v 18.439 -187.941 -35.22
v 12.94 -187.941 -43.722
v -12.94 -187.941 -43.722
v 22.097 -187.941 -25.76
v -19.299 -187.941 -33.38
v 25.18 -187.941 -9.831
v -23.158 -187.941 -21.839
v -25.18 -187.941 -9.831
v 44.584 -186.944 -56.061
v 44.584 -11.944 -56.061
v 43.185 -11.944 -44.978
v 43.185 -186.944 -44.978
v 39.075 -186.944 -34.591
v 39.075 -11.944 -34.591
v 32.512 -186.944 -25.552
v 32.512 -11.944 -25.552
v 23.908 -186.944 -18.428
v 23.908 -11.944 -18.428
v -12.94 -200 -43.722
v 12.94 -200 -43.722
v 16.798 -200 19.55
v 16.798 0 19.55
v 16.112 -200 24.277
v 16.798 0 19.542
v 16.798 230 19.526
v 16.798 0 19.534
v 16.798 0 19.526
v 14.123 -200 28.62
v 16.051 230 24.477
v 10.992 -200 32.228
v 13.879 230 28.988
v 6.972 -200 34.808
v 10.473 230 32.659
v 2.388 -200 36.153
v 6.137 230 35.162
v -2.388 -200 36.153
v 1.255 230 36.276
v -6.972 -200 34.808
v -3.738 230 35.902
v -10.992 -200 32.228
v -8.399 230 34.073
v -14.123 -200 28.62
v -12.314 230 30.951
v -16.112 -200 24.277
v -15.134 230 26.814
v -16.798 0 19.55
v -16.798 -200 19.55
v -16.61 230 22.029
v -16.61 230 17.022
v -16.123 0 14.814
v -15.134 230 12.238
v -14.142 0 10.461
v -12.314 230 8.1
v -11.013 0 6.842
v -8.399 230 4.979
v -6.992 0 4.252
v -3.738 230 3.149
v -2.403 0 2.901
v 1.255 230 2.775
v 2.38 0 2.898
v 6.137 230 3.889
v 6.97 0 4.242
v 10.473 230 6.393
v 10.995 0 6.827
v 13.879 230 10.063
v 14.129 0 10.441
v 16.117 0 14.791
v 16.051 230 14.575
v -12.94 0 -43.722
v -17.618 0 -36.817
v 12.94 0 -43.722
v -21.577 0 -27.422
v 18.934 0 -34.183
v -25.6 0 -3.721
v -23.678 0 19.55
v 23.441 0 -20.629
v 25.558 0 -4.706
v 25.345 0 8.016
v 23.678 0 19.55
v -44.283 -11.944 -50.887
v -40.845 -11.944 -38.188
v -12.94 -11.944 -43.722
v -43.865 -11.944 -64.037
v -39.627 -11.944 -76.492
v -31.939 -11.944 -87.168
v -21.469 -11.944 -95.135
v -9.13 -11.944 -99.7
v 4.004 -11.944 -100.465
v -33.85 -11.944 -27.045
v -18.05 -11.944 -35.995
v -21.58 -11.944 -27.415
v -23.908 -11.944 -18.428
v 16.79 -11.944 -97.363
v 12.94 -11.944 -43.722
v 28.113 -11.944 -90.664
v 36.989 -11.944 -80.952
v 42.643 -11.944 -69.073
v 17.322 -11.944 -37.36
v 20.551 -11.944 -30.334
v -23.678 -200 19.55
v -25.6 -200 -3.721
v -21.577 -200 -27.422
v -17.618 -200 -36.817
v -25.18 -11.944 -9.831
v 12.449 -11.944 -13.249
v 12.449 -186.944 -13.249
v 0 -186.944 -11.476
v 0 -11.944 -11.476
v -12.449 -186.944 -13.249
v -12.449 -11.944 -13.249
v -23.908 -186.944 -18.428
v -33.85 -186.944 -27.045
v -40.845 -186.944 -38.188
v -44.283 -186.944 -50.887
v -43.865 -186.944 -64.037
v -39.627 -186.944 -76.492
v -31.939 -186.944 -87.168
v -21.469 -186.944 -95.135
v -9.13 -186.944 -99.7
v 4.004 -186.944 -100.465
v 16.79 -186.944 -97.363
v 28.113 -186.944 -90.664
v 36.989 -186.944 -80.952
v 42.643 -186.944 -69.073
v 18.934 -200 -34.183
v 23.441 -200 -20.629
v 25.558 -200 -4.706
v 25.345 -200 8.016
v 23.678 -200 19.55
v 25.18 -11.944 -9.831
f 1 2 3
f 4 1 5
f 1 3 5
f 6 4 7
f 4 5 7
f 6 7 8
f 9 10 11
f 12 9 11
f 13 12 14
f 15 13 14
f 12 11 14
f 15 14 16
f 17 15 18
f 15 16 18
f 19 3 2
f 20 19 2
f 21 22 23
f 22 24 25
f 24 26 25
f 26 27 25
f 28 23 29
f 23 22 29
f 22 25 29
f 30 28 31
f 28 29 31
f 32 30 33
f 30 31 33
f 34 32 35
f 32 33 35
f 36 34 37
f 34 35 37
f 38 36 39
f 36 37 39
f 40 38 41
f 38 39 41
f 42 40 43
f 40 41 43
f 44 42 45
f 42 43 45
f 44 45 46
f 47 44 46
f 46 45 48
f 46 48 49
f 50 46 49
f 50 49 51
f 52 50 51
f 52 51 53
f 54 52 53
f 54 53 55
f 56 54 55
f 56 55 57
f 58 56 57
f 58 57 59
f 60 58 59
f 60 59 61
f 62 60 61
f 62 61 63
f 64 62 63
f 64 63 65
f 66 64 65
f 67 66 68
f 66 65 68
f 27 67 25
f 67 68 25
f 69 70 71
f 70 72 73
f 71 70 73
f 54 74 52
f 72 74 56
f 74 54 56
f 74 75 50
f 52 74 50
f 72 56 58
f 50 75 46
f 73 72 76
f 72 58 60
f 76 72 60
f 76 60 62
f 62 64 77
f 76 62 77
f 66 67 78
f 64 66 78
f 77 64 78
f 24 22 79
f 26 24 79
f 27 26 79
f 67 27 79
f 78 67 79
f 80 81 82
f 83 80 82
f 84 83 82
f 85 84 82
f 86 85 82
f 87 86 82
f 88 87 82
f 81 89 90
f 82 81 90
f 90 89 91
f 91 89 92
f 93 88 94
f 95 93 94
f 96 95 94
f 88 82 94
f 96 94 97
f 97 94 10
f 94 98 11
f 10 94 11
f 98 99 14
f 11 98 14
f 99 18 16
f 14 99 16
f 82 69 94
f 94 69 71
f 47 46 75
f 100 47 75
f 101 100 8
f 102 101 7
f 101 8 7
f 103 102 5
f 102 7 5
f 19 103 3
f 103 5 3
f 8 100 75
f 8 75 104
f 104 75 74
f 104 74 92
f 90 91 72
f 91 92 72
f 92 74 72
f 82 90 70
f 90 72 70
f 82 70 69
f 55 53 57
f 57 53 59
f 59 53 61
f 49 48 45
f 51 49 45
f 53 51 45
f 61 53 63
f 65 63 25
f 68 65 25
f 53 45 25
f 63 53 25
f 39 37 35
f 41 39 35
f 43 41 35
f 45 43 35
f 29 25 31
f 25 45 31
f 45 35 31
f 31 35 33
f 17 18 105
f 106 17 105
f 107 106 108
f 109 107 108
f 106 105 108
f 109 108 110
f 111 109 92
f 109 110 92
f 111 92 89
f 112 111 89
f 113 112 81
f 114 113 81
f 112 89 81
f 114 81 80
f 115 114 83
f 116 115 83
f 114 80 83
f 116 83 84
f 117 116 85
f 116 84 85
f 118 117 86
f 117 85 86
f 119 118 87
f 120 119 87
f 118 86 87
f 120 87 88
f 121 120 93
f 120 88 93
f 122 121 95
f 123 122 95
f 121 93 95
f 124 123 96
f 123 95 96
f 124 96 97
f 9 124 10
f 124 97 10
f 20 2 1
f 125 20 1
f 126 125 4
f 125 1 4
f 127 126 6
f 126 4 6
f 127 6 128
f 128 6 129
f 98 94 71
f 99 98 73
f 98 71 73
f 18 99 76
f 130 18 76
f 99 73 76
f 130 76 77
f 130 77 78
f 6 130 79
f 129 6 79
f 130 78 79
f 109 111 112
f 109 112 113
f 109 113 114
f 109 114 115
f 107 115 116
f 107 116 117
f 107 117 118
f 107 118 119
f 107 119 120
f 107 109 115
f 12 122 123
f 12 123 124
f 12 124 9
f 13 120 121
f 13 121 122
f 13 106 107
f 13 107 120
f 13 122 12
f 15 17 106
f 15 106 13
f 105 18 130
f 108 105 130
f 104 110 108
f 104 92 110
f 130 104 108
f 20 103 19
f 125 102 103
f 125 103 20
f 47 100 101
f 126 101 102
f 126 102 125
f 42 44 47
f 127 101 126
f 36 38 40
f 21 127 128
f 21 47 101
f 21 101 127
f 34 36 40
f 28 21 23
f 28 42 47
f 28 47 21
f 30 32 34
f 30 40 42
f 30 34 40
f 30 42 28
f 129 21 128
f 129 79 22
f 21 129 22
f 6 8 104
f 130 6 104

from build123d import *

# Parameters (mm, degrees)
F1_DEPTH = 200
F3_R     = 16.7976843787
F4_DEPTH = 430
F6_W     = 175.9967375547
F6_H     = 67.8384676576
F7_DEPTH = 100
F9_DEPTH = 175


with BuildPart() as f1:
    # F0 (on Front) → F1 (new body)
    with BuildSketch(Plane.XZ):
        with BuildLine():
            add(Edge.make_bspline(
                [(-23.6778533361, 19.5495877862), (-32.3621949462, -21.3626975394), (-12.9401370946, -43.7215901911)],
                knots=[1.1743261985, 1.1743261985, 1.1743261985, 2.6132353561, 2.6132353561, 2.6132353561], degree=2, weights=[1, 0.7521652597, 1]))
            Line((-12.9401370946, -43.7215901911), (12.9401370946, -43.7215901911))
            add(Edge.make_bspline(
                [(12.9401370946, -43.7215901911), (32.3621949462, -21.3626975394), (23.6778533361, 19.5495877862)],
                knots=[3.6699499511, 3.6699499511, 3.6699499511, 5.1088591087, 5.1088591087, 5.1088591087], degree=2, weights=[1, 0.7521652597, 1]))
            Line((23.6778533361, 19.5495877862), (-23.6778533361, 19.5495877862))
        make_face()
    extrude(amount=F1_DEPTH)

    # F3 (on offset) → F4 (join)
    with BuildSketch(Plane.XZ.offset(-230)):
        with Locations((0, 19.52576451)):
            Circle(F3_R)
    extrude(amount=F4_DEPTH)

    # F6 (on offset) → F7 (cut)
    with BuildSketch(Plane.YZ.offset(-30)):
        with Locations((-99.9427214265, -43.750282377)):
            Rectangle(F6_W, F6_H)
    extrude(amount=F7_DEPTH, mode=Mode.SUBTRACT)

    # F8 (on face) → F9 (join)
    with BuildSketch(Plane.XZ.offset(11.9443526492)):
        with BuildLine():
            ThreePointArc((-23.9079126368, -18.4283503945), (-21.4691661744, -95.1354199868), (44.5844215941, -56.0605488718))
            ThreePointArc((44.5844215941, -56.0605488718), (39.0748711148, -34.591382697), (23.907912636, -18.428350394))
            add(Edge.make_bspline(
                [(23.907912636, -18.428350394), (23.7403211383, -19.2740561298), (23.5629806702, -20.1178270573), (23.375722619, -20.959489825), (23.1783610081, -21.7988580379), (22.9706905105, -22.6357318329), (22.7524836933, -23.4698972976), (22.5234871985, -24.301125666), (21.8162555534, -26.7404941038), (21.3073183679, -28.3392219433), (20.754454425, -29.9239250097), (20.1551733117, -31.4923659659), (19.5066312989, -33.0414940382), (18.8054862218, -34.5673766033), (18.0477798353, -36.0651478958), (16.7672298185, -38.3517175377), (16.2868400055, -39.1637140236), (15.7860476096, -39.9635970623), (15.2638749499, -40.7499882648), (14.7193047849, -41.5211878034), (14.1512732931, -42.2751690498), (13.5586431482, -43.0095590272), (12.9401370946, -43.7215901911)],
                knots=[0.2378023461, 0.2378023461, 0.2378023461, 0.2378023461, 0.2378023461, 0.2378023461, 0.2378023461, 0.2378023461, 0.2378023461, 0.4264523686, 0.4264523686, 0.4264523686, 0.4264523686, 0.4264523686, 0.4264523686, 0.4264523686, 0.7935523887, 0.7935523887, 0.7935523887, 0.7935523887, 0.7935523887, 0.7935523887, 0.7935523887, 1, 1, 1, 1, 1, 1, 1, 1, 1], degree=8))
            Line((12.9401370946, -43.7215901911), (-12.9401370946, -43.7215901911))
            add(Edge.make_bspline(
                [(-12.9401370946, -43.7215901911), (-13.5586431482, -43.0095590272), (-14.1512732931, -42.2751690498), (-14.7193047849, -41.5211878034), (-15.2638749499, -40.7499882648), (-15.7860476096, -39.9635970623), (-16.2868400055, -39.1637140236), (-16.7672298185, -38.3517175377), (-18.043616681, -36.0725816877), (-18.7977894386, -34.5825873298), (-19.4959463044, -33.0647358798), (-20.1419918652, -31.5238279251), (-20.7392245037, -29.9637460227), (-21.2904531713, -28.3875056791), (-21.7981390661, -26.7973221406), (-22.507625983, -24.3586134522), (-22.739531347, -23.5193487447), (-22.9604201458, -22.6770764585), (-23.17055429, -21.8320330534), (-23.3701686358, -20.9844394656), (-23.5594750148, -20.1345019592), (-23.7386651299, -19.2824127385), (-23.9079126368, -18.4283503945)],
                knots=[0, 0, 0, 0, 0, 0, 0, 0, 0, 0.2064476064, 0.2064476064, 0.2064476064, 0.2064476064, 0.2064476064, 0.2064476064, 0.2064476064, 0.5716829759, 0.5716829759, 0.5716829759, 0.5716829759, 0.5716829759, 0.5716829759, 0.5716829759, 0.7621973133, 0.7621973133, 0.7621973133, 0.7621973133, 0.7621973133, 0.7621973133, 0.7621973133, 0.7621973133, 0.7621973133], degree=8))
        make_face()
        with BuildLine():
            add(Edge.make_bspline(
                [(23.907912636, -18.428350394), (23.7403211383, -19.2740561298), (23.5629806702, -20.1178270573), (23.375722619, -20.959489825), (23.1783610081, -21.7988580379), (22.9706905105, -22.6357318329), (22.7524836933, -23.4698972976), (22.5234871985, -24.301125666), (21.8162555534, -26.7404941038), (21.3073183679, -28.3392219433), (20.754454425, -29.9239250097), (20.1551733117, -31.4923659659), (19.5066312989, -33.0414940382), (18.8054862218, -34.5673766033), (18.0477798353, -36.0651478958), (16.7672298185, -38.3517175377), (16.2868400055, -39.1637140236), (15.7860476096, -39.9635970623), (15.2638749499, -40.7499882648), (14.7193047849, -41.5211878034), (14.1512732931, -42.2751690498), (13.5586431482, -43.0095590272), (12.9401370946, -43.7215901911)],
                knots=[0.2378023461, 0.2378023461, 0.2378023461, 0.2378023461, 0.2378023461, 0.2378023461, 0.2378023461, 0.2378023461, 0.2378023461, 0.4264523686, 0.4264523686, 0.4264523686, 0.4264523686, 0.4264523686, 0.4264523686, 0.4264523686, 0.7935523887, 0.7935523887, 0.7935523887, 0.7935523887, 0.7935523887, 0.7935523887, 0.7935523887, 1, 1, 1, 1, 1, 1, 1, 1, 1], degree=8))
            ThreePointArc((23.907912636, -18.428350394), (-5e-10, -11.4761272777), (-23.9079126368, -18.4283503945))
            add(Edge.make_bspline(
                [(-12.9401370946, -43.7215901911), (-13.5586431482, -43.0095590272), (-14.1512732931, -42.2751690498), (-14.7193047849, -41.5211878034), (-15.2638749499, -40.7499882648), (-15.7860476096, -39.9635970623), (-16.2868400055, -39.1637140236), (-16.7672298185, -38.3517175377), (-18.043616681, -36.0725816877), (-18.7977894386, -34.5825873298), (-19.4959463044, -33.0647358798), (-20.1419918652, -31.5238279251), (-20.7392245037, -29.9637460227), (-21.2904531713, -28.3875056791), (-21.7981390661, -26.7973221406), (-22.507625983, -24.3586134522), (-22.739531347, -23.5193487447), (-22.9604201458, -22.6770764585), (-23.17055429, -21.8320330534), (-23.3701686358, -20.9844394656), (-23.5594750148, -20.1345019592), (-23.7386651299, -19.2824127385), (-23.9079126368, -18.4283503945)],
                knots=[0, 0, 0, 0, 0, 0, 0, 0, 0, 0.2064476064, 0.2064476064, 0.2064476064, 0.2064476064, 0.2064476064, 0.2064476064, 0.2064476064, 0.5716829759, 0.5716829759, 0.5716829759, 0.5716829759, 0.5716829759, 0.5716829759, 0.5716829759, 0.7621973133, 0.7621973133, 0.7621973133, 0.7621973133, 0.7621973133, 0.7621973133, 0.7621973133, 0.7621973133, 0.7621973133], degree=8))
            Line((-12.9401370946, -43.7215901911), (12.9401370946, -43.7215901911))
        make_face()
    extrude(amount=F9_DEPTH)


solid = f1.part
